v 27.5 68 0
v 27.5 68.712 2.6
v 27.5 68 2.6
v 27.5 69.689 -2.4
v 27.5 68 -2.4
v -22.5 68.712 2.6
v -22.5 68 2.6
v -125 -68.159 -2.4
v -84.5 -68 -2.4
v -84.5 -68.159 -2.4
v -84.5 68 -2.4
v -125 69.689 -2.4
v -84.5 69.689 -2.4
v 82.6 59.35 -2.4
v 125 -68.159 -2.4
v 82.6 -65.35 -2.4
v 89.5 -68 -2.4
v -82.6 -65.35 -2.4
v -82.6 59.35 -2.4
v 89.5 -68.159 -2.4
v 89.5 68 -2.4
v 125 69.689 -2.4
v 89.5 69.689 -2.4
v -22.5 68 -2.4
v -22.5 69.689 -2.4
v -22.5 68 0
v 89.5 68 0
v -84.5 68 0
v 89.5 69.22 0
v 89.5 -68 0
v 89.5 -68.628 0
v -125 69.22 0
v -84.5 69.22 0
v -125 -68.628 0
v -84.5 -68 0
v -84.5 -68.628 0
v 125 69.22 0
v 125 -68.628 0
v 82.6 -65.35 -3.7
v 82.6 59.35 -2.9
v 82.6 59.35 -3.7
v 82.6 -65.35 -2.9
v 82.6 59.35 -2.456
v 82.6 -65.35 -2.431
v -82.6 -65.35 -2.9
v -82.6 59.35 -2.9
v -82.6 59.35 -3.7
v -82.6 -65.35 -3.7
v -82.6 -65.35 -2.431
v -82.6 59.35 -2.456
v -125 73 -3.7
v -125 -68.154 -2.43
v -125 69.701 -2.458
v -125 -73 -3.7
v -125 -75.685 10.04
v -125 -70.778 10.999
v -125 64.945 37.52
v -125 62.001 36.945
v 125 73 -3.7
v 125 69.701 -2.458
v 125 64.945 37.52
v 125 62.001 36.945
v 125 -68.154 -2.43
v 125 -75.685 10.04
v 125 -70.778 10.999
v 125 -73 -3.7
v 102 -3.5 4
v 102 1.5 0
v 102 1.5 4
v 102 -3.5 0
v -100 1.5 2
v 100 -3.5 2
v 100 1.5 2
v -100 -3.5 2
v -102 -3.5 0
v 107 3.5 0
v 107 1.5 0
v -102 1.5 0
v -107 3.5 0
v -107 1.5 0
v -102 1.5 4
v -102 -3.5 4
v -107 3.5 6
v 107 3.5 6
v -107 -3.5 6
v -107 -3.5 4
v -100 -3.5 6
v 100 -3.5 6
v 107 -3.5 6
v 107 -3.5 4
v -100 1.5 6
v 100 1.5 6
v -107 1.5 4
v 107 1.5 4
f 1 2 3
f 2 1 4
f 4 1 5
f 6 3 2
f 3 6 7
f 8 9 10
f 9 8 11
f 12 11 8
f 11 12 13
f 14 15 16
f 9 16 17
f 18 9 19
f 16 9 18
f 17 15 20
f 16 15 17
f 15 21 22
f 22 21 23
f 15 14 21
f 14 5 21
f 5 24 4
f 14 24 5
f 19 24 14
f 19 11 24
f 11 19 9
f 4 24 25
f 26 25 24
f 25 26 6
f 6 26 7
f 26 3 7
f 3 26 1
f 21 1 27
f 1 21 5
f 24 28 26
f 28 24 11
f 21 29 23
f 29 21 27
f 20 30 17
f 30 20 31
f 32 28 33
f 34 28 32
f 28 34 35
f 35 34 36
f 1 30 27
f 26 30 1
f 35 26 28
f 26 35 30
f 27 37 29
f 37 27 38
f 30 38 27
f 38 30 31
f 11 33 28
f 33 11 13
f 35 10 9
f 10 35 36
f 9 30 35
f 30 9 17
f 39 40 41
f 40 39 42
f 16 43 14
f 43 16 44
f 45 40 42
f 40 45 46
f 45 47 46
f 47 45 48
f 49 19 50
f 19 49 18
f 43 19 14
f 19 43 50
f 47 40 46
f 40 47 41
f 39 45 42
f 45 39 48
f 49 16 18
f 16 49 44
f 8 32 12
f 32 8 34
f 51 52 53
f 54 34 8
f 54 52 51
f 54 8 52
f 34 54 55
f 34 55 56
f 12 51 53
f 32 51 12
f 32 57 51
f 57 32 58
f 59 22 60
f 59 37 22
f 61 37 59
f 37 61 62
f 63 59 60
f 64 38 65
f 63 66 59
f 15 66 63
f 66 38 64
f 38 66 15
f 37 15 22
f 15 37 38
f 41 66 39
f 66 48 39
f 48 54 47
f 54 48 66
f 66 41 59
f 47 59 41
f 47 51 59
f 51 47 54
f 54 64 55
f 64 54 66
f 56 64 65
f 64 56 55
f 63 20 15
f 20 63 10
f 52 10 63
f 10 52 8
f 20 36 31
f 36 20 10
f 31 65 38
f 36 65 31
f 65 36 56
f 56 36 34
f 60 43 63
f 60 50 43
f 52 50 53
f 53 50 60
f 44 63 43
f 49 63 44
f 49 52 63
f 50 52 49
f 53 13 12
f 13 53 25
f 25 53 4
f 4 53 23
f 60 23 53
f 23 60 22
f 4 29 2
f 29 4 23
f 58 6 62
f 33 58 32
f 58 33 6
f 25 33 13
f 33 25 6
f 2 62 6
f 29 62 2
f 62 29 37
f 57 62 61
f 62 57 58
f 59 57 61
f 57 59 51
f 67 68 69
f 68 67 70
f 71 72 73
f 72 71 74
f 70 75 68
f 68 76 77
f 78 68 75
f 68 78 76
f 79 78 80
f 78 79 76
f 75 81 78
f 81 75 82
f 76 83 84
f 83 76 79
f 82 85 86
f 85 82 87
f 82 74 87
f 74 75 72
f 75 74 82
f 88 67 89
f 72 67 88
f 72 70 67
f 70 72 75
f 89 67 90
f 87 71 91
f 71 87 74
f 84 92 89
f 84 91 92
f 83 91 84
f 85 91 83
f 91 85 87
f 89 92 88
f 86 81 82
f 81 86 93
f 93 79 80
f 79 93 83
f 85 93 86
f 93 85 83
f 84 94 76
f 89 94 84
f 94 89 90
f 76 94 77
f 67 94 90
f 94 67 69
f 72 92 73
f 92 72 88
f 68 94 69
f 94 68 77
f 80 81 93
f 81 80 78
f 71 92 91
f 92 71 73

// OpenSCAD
$fn=100;
mar = 0.01;

// == Parameters for LCD
// https://cdn.shopify.com/s/files/1/0174/1800/files/PIM372-drawing.png?v=1651156568
screen_width      = 174.00;
screen_length     = 136.00;
screen_thickness  = 2.5-0.1; //screen is 2.5 but this left to much movement -> -0.1
screen_bwidth     = 165.20;
screen_blength    = 124.70; 
screen_cablew     = 50;
screen_cablel     = 2;
// screen is not completely center in the panel at the top of the panel there is
// at bit more space; therefore the hole for the screen needs to move offset up
// first is left; second top
screen_offset     = [2.5,3];




case_length = 150-4;
case_width  = 250;
case_h1     = 14;
case_h2     = 42;
case_walls  = 3;
case_wallb  = 3;
case_wallf  = 5;
case_wallt  = 1.3;

case_phi    = 90-acos((case_h2 - case_h1)/case_length);



translate([0, 0, -screen_thickness]) {
  translate([screen_offset[0], 0, 0])
    lcd();
  case_base1();
}


back_supw    = screen_width+40;
back_supl    = 7;
back_supt    = 2;
back_suph    = 4;

ccube([back_supw-2*(back_supl-back_supt), back_supl, back_supt]);
translate([-back_supw/2+back_supl/2, 0, back_suph])
  ccube([back_supl, back_supl, back_supt]);
translate([+back_supw/2-back_supl/2, 0, back_suph])
  ccube([back_supl, back_supl, back_supt]);
translate([0, back_supl/2-back_supt/2, 0])
  ccube([back_supw, back_supt, back_suph+back_supt]);
translate([-back_supw/2-back_supt/2+back_supl, 0, 0])
  ccube([back_supt, back_supl, back_suph+back_supt]);
translate([+back_supw/2+back_supt/2-back_supl, 0, 0])
  ccube([back_supt, back_supl, back_suph+back_supt]);
//cube([back_screww, back_supl, back_screwh]);



// Wedge shaped case with hole for screen; no sides or
// bottom. 
module case_base1() {
  translate([0, 0, -case_wallt])
  difference() {
    color("steelblue")
      case_base0();
    translate([0, -screen_offset[1], -1])
      ccube([screen_bwidth, screen_blength, case_wallt+2]);
  }
  // Raised edges at the sides of the screen
  wl = (case_width - screen_width)/2 + screen_offset[0];
  ll = case_length - case_wallb;
  translate([-case_width/2, -case_length/2, 0])
    cube([wl, ll, screen_thickness]);
  wr = (case_width - screen_width)/2 - screen_offset[0];
  lr = case_length - case_wallb;
  translate([case_width/2-wr, -case_length/2, 0])
    cube([wr, lr, screen_thickness]);
}


// Wedge shaped case; no sides and no bottom
module case_base0() {
  mirror([0, 0, 1])
  translate([-case_width/2, -case_length/2, 0])
  rotate([90, 0, 90])
  linear_extrude(case_width)
  rotate([0, 0, -case_phi])
  difference() {
    polygon([
      [0, -case_h1], 
      [case_length*cos(case_phi), -case_h1],
      [case_length*cos(case_phi), case_h2-case_h1],
      [0, 0] 
    ]);
    polygon([
      [case_wallf, 
        -case_wallt*cos(case_phi)+case_wallf*sin(case_phi)],
      [case_wallf, -case_h1-0.1],
      [case_length*cos(case_phi)-case_wallb, -case_h1-0.1],
      [case_length*cos(case_phi)-case_wallb, 
        case_h2-case_h1-case_wallt*cos(case_phi)-case_wallb*sin(case_phi)],
    ]);
  }
}


module lcd() {
  color("black")
    translate([-screen_cablew/2, screen_length/2, 0])
    cube([screen_cablew, screen_cablel, 5]);
  color("lightgray")
    ccube([screen_width, screen_length, screen_thickness]);
  color("black") 
    translate([-screen_offset[0], -screen_offset[1], -0.5])
    ccube([screen_bwidth, screen_blength, 0.6]);
}

// =============================================================
module ccube(dim) {
  translate([-dim[0]/2, -dim[1]/2, 0])
    cube(dim);
}
